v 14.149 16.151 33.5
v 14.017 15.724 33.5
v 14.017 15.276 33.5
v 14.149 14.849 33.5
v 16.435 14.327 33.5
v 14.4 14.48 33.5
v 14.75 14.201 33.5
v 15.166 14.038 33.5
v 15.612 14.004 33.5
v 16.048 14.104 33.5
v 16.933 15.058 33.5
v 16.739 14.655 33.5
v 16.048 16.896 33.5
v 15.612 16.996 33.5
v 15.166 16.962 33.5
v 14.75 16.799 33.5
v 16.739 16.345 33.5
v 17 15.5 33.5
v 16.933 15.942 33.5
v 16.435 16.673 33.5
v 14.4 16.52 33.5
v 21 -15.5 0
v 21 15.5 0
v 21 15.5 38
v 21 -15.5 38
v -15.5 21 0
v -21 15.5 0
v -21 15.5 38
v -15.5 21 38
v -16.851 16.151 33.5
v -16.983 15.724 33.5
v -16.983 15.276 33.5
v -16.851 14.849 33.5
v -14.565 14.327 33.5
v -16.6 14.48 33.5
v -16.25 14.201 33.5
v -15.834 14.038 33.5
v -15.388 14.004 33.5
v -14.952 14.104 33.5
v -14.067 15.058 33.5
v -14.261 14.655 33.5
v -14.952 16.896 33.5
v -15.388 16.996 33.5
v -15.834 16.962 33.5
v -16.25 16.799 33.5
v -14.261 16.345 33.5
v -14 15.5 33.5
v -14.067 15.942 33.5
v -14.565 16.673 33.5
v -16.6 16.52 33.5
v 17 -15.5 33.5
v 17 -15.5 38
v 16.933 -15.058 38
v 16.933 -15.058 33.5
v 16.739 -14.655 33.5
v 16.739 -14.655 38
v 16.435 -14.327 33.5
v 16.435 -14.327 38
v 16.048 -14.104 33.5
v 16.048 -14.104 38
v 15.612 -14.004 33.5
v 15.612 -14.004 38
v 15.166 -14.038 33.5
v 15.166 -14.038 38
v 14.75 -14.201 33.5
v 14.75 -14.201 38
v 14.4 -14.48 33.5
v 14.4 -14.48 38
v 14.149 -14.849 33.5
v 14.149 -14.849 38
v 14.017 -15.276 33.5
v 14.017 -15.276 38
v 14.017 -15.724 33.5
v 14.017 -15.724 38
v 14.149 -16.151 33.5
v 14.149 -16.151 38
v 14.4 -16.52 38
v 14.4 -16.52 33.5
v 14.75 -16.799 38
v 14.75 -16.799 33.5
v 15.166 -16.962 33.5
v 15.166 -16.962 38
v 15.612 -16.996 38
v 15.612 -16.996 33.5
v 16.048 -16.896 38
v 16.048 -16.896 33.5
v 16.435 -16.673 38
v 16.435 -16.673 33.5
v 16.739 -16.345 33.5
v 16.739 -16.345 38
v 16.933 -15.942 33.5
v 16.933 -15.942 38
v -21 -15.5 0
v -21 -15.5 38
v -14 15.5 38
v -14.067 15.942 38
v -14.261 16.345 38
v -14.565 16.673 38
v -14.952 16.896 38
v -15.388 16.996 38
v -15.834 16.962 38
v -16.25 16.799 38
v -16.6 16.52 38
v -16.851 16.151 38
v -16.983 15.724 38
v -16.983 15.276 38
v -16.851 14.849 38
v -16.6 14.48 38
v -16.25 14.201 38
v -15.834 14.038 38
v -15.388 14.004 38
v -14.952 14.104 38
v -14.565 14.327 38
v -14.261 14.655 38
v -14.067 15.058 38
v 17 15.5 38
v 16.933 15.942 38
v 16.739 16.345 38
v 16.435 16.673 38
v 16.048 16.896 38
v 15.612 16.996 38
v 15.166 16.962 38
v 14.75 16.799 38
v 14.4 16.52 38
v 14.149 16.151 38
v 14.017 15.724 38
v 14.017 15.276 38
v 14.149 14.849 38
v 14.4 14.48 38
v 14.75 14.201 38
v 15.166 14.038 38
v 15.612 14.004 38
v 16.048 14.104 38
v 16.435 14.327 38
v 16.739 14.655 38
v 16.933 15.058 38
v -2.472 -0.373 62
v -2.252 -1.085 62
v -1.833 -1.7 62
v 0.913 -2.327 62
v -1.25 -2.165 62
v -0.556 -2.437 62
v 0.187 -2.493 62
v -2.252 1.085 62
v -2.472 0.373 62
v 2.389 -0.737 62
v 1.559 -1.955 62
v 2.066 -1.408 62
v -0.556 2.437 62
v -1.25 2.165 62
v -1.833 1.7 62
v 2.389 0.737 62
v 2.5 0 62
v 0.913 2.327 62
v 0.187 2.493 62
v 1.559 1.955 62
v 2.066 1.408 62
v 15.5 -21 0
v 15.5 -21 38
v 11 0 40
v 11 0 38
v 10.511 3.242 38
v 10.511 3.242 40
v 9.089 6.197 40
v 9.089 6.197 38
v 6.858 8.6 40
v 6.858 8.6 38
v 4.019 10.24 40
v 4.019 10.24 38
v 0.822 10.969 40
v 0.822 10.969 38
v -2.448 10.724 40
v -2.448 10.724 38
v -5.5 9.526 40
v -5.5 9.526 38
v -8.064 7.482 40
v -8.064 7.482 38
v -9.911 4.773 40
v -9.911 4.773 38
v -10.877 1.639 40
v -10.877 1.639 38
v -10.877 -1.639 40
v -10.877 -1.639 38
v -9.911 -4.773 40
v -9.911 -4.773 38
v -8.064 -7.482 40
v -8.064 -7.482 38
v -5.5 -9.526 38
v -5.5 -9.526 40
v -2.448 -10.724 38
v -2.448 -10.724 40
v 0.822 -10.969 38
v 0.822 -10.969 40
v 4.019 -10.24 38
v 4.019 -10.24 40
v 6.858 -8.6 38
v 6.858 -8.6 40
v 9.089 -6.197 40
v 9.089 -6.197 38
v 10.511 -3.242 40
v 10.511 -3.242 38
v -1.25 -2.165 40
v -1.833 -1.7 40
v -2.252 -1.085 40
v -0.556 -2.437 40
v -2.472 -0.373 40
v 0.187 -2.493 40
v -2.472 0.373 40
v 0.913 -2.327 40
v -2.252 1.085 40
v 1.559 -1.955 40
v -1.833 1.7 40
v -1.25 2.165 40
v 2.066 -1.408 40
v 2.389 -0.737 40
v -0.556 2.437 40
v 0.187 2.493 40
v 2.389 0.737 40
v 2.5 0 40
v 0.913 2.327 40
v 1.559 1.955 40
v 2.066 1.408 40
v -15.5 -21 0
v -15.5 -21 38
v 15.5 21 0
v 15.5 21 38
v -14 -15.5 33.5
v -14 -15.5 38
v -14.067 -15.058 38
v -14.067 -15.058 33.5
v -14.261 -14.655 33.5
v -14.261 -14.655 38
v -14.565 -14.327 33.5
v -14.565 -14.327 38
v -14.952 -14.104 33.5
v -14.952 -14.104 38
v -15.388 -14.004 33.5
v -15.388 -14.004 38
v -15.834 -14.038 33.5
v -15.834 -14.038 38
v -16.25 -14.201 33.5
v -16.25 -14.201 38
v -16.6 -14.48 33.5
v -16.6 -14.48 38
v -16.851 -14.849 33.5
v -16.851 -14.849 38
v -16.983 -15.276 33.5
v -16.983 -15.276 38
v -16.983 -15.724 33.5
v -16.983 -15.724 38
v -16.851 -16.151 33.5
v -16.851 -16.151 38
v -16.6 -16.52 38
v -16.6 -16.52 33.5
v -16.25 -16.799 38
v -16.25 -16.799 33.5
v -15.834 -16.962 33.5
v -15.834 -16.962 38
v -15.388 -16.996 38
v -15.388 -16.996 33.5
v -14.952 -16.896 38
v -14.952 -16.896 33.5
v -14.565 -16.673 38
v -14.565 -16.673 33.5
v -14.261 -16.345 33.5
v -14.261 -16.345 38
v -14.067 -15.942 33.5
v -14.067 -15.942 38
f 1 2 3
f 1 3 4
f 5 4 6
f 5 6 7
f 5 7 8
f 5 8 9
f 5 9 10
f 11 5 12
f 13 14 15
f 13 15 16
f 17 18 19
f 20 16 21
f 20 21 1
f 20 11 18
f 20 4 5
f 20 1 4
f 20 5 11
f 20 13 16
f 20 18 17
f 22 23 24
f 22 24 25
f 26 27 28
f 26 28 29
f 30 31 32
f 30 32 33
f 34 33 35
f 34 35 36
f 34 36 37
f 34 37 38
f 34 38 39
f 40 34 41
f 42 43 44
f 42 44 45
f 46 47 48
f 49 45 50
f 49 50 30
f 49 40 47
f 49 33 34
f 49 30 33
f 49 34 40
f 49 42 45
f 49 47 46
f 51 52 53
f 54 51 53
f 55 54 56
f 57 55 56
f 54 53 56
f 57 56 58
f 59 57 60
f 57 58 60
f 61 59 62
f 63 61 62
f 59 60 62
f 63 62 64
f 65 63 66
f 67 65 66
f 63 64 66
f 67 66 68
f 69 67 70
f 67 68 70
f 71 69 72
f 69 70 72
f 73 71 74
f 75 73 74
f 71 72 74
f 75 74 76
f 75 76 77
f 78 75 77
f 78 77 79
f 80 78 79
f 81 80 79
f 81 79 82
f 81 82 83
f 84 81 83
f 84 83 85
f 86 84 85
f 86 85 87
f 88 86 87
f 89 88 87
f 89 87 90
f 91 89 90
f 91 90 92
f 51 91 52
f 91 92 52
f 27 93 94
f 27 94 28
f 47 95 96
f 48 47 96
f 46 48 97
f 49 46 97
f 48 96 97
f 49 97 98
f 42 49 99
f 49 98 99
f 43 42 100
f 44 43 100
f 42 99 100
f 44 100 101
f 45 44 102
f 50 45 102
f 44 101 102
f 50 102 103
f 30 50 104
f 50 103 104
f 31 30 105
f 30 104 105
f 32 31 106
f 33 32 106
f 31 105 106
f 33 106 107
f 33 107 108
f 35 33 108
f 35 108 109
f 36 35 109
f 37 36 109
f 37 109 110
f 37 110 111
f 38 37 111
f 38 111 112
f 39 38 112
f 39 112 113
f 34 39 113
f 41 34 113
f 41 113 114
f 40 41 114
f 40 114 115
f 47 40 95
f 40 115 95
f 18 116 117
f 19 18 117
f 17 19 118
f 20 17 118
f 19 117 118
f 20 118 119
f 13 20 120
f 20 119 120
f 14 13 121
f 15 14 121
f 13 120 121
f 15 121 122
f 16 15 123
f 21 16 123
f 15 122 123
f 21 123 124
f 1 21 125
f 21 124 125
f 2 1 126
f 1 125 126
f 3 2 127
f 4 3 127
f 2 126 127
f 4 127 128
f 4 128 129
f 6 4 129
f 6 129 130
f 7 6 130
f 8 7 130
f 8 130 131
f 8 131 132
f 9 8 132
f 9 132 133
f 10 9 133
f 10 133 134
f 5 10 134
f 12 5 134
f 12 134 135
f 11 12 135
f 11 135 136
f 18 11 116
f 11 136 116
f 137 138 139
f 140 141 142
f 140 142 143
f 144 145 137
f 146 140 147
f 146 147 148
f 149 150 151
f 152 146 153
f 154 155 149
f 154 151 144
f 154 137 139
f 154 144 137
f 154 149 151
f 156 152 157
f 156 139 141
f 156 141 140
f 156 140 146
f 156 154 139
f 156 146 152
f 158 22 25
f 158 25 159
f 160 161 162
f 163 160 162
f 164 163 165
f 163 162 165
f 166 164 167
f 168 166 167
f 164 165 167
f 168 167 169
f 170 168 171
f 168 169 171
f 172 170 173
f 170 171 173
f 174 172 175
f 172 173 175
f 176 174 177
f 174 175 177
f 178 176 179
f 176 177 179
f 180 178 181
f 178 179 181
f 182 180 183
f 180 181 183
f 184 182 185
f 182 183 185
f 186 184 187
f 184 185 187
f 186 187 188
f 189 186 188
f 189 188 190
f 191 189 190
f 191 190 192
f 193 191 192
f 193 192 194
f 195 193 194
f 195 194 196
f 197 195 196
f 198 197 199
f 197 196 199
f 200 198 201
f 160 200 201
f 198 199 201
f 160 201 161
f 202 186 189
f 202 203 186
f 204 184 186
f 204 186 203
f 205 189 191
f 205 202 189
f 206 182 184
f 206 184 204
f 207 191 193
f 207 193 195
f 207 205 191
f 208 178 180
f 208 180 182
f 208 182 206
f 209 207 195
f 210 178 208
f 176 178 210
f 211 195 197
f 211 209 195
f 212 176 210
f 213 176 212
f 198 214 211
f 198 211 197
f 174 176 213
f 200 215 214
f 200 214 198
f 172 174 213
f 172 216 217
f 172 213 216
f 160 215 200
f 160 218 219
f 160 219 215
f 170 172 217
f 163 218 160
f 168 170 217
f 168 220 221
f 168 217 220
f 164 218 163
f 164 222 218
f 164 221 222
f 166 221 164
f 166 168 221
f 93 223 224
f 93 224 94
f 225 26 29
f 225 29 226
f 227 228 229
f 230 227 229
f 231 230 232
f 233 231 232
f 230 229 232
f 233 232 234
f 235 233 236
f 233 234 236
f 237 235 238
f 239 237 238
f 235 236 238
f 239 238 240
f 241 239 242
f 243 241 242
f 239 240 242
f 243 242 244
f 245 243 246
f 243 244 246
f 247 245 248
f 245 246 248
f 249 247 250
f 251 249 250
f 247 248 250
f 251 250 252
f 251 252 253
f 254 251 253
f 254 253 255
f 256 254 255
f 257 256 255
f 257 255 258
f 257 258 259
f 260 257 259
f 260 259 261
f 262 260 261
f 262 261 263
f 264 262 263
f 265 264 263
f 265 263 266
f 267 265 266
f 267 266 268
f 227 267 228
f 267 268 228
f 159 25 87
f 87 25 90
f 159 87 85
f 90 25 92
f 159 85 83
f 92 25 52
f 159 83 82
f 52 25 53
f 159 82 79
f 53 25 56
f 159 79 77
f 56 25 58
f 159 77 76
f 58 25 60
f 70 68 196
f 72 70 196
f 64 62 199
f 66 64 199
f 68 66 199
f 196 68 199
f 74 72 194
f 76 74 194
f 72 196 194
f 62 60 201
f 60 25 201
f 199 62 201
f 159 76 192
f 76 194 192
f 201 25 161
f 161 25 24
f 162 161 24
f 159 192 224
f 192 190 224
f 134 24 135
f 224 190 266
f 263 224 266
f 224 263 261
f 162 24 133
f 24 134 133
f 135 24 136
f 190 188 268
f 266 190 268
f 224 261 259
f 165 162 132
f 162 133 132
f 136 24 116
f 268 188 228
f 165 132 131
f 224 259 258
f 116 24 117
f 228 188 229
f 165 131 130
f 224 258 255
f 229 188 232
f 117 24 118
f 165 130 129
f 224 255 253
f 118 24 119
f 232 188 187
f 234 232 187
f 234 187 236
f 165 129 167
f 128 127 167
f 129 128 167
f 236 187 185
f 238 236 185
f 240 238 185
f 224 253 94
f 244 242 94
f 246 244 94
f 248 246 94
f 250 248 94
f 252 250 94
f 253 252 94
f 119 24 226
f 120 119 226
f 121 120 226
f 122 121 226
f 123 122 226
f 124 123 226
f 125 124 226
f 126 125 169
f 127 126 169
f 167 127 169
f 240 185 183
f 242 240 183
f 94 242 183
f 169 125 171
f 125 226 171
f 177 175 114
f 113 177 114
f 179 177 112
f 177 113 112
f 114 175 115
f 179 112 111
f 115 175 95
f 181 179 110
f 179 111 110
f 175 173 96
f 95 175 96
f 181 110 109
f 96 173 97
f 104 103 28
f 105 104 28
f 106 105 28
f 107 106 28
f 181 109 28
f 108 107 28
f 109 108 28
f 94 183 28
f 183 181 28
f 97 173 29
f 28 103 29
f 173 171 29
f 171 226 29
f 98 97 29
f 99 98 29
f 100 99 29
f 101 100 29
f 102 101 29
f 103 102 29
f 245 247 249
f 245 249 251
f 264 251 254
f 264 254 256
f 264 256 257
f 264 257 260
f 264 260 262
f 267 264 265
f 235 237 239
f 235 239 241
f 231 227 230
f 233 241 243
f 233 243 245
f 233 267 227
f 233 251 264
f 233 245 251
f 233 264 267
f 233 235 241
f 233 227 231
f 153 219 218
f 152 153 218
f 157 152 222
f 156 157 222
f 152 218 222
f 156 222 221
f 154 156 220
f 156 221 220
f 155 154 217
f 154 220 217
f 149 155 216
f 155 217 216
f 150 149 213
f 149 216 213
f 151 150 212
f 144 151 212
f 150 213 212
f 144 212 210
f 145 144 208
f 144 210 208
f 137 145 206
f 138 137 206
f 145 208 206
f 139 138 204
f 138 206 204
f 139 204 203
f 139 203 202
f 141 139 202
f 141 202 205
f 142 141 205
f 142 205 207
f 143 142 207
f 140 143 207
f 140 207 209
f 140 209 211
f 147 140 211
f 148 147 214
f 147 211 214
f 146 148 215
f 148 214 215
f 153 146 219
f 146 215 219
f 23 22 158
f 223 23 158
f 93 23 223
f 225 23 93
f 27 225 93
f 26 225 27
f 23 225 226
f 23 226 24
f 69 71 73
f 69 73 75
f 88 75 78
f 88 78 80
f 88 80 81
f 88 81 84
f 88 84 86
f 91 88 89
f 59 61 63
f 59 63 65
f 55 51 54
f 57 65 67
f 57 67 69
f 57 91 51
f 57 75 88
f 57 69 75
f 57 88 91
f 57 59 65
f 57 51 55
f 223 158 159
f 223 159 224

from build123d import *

# Parameters (mm, degrees)
PAD_DEPTH    = 38
SKETCH001_R  = 1.5
POCKET_DEPTH = 4.5
SKETCH002_R  = 11
PAD001_DEPTH = 2
SKETCH003_R  = 2.5
PAD002_DEPTH = 22


with BuildPart() as part:
    # Sketch → Pad (new body)
    with BuildSketch(Plane.XY):
        Polygon((-21, 15.5), (-15.5, 21), (15.5, 21), (21, 15.5), (21, -15.5), (15.5, -21), (-15.5, -21), (-21, -15.5), align=None)
    extrude(amount=PAD_DEPTH)

    # Sketch001 (on Face10 of Pad) → Pocket (cut)
    with BuildSketch(Plane.XY.offset(38)):
        with Locations((-15.5, 15.5)):
            Circle(SKETCH001_R)
        with Locations((15.5, 15.5)):
            Circle(SKETCH001_R)
        with Locations((15.5, -15.5)):
            Circle(SKETCH001_R)
        with Locations((-15.5, -15.5)):
            Circle(SKETCH001_R)
    extrude(amount=-POCKET_DEPTH, mode=Mode.SUBTRACT)

    # Sketch002 (on Face5 of Pocket) → Pad001 (join)
    with BuildSketch(Plane.XY.offset(38)):
        Circle(SKETCH002_R)
    extrude(amount=PAD001_DEPTH)

    # Sketch003 (on Face17 of Pad001) → Pad002 (join)
    with BuildSketch(Plane.XY.offset(40)):
        Circle(SKETCH003_R)
    extrude(amount=PAD002_DEPTH)


solid = part.part
